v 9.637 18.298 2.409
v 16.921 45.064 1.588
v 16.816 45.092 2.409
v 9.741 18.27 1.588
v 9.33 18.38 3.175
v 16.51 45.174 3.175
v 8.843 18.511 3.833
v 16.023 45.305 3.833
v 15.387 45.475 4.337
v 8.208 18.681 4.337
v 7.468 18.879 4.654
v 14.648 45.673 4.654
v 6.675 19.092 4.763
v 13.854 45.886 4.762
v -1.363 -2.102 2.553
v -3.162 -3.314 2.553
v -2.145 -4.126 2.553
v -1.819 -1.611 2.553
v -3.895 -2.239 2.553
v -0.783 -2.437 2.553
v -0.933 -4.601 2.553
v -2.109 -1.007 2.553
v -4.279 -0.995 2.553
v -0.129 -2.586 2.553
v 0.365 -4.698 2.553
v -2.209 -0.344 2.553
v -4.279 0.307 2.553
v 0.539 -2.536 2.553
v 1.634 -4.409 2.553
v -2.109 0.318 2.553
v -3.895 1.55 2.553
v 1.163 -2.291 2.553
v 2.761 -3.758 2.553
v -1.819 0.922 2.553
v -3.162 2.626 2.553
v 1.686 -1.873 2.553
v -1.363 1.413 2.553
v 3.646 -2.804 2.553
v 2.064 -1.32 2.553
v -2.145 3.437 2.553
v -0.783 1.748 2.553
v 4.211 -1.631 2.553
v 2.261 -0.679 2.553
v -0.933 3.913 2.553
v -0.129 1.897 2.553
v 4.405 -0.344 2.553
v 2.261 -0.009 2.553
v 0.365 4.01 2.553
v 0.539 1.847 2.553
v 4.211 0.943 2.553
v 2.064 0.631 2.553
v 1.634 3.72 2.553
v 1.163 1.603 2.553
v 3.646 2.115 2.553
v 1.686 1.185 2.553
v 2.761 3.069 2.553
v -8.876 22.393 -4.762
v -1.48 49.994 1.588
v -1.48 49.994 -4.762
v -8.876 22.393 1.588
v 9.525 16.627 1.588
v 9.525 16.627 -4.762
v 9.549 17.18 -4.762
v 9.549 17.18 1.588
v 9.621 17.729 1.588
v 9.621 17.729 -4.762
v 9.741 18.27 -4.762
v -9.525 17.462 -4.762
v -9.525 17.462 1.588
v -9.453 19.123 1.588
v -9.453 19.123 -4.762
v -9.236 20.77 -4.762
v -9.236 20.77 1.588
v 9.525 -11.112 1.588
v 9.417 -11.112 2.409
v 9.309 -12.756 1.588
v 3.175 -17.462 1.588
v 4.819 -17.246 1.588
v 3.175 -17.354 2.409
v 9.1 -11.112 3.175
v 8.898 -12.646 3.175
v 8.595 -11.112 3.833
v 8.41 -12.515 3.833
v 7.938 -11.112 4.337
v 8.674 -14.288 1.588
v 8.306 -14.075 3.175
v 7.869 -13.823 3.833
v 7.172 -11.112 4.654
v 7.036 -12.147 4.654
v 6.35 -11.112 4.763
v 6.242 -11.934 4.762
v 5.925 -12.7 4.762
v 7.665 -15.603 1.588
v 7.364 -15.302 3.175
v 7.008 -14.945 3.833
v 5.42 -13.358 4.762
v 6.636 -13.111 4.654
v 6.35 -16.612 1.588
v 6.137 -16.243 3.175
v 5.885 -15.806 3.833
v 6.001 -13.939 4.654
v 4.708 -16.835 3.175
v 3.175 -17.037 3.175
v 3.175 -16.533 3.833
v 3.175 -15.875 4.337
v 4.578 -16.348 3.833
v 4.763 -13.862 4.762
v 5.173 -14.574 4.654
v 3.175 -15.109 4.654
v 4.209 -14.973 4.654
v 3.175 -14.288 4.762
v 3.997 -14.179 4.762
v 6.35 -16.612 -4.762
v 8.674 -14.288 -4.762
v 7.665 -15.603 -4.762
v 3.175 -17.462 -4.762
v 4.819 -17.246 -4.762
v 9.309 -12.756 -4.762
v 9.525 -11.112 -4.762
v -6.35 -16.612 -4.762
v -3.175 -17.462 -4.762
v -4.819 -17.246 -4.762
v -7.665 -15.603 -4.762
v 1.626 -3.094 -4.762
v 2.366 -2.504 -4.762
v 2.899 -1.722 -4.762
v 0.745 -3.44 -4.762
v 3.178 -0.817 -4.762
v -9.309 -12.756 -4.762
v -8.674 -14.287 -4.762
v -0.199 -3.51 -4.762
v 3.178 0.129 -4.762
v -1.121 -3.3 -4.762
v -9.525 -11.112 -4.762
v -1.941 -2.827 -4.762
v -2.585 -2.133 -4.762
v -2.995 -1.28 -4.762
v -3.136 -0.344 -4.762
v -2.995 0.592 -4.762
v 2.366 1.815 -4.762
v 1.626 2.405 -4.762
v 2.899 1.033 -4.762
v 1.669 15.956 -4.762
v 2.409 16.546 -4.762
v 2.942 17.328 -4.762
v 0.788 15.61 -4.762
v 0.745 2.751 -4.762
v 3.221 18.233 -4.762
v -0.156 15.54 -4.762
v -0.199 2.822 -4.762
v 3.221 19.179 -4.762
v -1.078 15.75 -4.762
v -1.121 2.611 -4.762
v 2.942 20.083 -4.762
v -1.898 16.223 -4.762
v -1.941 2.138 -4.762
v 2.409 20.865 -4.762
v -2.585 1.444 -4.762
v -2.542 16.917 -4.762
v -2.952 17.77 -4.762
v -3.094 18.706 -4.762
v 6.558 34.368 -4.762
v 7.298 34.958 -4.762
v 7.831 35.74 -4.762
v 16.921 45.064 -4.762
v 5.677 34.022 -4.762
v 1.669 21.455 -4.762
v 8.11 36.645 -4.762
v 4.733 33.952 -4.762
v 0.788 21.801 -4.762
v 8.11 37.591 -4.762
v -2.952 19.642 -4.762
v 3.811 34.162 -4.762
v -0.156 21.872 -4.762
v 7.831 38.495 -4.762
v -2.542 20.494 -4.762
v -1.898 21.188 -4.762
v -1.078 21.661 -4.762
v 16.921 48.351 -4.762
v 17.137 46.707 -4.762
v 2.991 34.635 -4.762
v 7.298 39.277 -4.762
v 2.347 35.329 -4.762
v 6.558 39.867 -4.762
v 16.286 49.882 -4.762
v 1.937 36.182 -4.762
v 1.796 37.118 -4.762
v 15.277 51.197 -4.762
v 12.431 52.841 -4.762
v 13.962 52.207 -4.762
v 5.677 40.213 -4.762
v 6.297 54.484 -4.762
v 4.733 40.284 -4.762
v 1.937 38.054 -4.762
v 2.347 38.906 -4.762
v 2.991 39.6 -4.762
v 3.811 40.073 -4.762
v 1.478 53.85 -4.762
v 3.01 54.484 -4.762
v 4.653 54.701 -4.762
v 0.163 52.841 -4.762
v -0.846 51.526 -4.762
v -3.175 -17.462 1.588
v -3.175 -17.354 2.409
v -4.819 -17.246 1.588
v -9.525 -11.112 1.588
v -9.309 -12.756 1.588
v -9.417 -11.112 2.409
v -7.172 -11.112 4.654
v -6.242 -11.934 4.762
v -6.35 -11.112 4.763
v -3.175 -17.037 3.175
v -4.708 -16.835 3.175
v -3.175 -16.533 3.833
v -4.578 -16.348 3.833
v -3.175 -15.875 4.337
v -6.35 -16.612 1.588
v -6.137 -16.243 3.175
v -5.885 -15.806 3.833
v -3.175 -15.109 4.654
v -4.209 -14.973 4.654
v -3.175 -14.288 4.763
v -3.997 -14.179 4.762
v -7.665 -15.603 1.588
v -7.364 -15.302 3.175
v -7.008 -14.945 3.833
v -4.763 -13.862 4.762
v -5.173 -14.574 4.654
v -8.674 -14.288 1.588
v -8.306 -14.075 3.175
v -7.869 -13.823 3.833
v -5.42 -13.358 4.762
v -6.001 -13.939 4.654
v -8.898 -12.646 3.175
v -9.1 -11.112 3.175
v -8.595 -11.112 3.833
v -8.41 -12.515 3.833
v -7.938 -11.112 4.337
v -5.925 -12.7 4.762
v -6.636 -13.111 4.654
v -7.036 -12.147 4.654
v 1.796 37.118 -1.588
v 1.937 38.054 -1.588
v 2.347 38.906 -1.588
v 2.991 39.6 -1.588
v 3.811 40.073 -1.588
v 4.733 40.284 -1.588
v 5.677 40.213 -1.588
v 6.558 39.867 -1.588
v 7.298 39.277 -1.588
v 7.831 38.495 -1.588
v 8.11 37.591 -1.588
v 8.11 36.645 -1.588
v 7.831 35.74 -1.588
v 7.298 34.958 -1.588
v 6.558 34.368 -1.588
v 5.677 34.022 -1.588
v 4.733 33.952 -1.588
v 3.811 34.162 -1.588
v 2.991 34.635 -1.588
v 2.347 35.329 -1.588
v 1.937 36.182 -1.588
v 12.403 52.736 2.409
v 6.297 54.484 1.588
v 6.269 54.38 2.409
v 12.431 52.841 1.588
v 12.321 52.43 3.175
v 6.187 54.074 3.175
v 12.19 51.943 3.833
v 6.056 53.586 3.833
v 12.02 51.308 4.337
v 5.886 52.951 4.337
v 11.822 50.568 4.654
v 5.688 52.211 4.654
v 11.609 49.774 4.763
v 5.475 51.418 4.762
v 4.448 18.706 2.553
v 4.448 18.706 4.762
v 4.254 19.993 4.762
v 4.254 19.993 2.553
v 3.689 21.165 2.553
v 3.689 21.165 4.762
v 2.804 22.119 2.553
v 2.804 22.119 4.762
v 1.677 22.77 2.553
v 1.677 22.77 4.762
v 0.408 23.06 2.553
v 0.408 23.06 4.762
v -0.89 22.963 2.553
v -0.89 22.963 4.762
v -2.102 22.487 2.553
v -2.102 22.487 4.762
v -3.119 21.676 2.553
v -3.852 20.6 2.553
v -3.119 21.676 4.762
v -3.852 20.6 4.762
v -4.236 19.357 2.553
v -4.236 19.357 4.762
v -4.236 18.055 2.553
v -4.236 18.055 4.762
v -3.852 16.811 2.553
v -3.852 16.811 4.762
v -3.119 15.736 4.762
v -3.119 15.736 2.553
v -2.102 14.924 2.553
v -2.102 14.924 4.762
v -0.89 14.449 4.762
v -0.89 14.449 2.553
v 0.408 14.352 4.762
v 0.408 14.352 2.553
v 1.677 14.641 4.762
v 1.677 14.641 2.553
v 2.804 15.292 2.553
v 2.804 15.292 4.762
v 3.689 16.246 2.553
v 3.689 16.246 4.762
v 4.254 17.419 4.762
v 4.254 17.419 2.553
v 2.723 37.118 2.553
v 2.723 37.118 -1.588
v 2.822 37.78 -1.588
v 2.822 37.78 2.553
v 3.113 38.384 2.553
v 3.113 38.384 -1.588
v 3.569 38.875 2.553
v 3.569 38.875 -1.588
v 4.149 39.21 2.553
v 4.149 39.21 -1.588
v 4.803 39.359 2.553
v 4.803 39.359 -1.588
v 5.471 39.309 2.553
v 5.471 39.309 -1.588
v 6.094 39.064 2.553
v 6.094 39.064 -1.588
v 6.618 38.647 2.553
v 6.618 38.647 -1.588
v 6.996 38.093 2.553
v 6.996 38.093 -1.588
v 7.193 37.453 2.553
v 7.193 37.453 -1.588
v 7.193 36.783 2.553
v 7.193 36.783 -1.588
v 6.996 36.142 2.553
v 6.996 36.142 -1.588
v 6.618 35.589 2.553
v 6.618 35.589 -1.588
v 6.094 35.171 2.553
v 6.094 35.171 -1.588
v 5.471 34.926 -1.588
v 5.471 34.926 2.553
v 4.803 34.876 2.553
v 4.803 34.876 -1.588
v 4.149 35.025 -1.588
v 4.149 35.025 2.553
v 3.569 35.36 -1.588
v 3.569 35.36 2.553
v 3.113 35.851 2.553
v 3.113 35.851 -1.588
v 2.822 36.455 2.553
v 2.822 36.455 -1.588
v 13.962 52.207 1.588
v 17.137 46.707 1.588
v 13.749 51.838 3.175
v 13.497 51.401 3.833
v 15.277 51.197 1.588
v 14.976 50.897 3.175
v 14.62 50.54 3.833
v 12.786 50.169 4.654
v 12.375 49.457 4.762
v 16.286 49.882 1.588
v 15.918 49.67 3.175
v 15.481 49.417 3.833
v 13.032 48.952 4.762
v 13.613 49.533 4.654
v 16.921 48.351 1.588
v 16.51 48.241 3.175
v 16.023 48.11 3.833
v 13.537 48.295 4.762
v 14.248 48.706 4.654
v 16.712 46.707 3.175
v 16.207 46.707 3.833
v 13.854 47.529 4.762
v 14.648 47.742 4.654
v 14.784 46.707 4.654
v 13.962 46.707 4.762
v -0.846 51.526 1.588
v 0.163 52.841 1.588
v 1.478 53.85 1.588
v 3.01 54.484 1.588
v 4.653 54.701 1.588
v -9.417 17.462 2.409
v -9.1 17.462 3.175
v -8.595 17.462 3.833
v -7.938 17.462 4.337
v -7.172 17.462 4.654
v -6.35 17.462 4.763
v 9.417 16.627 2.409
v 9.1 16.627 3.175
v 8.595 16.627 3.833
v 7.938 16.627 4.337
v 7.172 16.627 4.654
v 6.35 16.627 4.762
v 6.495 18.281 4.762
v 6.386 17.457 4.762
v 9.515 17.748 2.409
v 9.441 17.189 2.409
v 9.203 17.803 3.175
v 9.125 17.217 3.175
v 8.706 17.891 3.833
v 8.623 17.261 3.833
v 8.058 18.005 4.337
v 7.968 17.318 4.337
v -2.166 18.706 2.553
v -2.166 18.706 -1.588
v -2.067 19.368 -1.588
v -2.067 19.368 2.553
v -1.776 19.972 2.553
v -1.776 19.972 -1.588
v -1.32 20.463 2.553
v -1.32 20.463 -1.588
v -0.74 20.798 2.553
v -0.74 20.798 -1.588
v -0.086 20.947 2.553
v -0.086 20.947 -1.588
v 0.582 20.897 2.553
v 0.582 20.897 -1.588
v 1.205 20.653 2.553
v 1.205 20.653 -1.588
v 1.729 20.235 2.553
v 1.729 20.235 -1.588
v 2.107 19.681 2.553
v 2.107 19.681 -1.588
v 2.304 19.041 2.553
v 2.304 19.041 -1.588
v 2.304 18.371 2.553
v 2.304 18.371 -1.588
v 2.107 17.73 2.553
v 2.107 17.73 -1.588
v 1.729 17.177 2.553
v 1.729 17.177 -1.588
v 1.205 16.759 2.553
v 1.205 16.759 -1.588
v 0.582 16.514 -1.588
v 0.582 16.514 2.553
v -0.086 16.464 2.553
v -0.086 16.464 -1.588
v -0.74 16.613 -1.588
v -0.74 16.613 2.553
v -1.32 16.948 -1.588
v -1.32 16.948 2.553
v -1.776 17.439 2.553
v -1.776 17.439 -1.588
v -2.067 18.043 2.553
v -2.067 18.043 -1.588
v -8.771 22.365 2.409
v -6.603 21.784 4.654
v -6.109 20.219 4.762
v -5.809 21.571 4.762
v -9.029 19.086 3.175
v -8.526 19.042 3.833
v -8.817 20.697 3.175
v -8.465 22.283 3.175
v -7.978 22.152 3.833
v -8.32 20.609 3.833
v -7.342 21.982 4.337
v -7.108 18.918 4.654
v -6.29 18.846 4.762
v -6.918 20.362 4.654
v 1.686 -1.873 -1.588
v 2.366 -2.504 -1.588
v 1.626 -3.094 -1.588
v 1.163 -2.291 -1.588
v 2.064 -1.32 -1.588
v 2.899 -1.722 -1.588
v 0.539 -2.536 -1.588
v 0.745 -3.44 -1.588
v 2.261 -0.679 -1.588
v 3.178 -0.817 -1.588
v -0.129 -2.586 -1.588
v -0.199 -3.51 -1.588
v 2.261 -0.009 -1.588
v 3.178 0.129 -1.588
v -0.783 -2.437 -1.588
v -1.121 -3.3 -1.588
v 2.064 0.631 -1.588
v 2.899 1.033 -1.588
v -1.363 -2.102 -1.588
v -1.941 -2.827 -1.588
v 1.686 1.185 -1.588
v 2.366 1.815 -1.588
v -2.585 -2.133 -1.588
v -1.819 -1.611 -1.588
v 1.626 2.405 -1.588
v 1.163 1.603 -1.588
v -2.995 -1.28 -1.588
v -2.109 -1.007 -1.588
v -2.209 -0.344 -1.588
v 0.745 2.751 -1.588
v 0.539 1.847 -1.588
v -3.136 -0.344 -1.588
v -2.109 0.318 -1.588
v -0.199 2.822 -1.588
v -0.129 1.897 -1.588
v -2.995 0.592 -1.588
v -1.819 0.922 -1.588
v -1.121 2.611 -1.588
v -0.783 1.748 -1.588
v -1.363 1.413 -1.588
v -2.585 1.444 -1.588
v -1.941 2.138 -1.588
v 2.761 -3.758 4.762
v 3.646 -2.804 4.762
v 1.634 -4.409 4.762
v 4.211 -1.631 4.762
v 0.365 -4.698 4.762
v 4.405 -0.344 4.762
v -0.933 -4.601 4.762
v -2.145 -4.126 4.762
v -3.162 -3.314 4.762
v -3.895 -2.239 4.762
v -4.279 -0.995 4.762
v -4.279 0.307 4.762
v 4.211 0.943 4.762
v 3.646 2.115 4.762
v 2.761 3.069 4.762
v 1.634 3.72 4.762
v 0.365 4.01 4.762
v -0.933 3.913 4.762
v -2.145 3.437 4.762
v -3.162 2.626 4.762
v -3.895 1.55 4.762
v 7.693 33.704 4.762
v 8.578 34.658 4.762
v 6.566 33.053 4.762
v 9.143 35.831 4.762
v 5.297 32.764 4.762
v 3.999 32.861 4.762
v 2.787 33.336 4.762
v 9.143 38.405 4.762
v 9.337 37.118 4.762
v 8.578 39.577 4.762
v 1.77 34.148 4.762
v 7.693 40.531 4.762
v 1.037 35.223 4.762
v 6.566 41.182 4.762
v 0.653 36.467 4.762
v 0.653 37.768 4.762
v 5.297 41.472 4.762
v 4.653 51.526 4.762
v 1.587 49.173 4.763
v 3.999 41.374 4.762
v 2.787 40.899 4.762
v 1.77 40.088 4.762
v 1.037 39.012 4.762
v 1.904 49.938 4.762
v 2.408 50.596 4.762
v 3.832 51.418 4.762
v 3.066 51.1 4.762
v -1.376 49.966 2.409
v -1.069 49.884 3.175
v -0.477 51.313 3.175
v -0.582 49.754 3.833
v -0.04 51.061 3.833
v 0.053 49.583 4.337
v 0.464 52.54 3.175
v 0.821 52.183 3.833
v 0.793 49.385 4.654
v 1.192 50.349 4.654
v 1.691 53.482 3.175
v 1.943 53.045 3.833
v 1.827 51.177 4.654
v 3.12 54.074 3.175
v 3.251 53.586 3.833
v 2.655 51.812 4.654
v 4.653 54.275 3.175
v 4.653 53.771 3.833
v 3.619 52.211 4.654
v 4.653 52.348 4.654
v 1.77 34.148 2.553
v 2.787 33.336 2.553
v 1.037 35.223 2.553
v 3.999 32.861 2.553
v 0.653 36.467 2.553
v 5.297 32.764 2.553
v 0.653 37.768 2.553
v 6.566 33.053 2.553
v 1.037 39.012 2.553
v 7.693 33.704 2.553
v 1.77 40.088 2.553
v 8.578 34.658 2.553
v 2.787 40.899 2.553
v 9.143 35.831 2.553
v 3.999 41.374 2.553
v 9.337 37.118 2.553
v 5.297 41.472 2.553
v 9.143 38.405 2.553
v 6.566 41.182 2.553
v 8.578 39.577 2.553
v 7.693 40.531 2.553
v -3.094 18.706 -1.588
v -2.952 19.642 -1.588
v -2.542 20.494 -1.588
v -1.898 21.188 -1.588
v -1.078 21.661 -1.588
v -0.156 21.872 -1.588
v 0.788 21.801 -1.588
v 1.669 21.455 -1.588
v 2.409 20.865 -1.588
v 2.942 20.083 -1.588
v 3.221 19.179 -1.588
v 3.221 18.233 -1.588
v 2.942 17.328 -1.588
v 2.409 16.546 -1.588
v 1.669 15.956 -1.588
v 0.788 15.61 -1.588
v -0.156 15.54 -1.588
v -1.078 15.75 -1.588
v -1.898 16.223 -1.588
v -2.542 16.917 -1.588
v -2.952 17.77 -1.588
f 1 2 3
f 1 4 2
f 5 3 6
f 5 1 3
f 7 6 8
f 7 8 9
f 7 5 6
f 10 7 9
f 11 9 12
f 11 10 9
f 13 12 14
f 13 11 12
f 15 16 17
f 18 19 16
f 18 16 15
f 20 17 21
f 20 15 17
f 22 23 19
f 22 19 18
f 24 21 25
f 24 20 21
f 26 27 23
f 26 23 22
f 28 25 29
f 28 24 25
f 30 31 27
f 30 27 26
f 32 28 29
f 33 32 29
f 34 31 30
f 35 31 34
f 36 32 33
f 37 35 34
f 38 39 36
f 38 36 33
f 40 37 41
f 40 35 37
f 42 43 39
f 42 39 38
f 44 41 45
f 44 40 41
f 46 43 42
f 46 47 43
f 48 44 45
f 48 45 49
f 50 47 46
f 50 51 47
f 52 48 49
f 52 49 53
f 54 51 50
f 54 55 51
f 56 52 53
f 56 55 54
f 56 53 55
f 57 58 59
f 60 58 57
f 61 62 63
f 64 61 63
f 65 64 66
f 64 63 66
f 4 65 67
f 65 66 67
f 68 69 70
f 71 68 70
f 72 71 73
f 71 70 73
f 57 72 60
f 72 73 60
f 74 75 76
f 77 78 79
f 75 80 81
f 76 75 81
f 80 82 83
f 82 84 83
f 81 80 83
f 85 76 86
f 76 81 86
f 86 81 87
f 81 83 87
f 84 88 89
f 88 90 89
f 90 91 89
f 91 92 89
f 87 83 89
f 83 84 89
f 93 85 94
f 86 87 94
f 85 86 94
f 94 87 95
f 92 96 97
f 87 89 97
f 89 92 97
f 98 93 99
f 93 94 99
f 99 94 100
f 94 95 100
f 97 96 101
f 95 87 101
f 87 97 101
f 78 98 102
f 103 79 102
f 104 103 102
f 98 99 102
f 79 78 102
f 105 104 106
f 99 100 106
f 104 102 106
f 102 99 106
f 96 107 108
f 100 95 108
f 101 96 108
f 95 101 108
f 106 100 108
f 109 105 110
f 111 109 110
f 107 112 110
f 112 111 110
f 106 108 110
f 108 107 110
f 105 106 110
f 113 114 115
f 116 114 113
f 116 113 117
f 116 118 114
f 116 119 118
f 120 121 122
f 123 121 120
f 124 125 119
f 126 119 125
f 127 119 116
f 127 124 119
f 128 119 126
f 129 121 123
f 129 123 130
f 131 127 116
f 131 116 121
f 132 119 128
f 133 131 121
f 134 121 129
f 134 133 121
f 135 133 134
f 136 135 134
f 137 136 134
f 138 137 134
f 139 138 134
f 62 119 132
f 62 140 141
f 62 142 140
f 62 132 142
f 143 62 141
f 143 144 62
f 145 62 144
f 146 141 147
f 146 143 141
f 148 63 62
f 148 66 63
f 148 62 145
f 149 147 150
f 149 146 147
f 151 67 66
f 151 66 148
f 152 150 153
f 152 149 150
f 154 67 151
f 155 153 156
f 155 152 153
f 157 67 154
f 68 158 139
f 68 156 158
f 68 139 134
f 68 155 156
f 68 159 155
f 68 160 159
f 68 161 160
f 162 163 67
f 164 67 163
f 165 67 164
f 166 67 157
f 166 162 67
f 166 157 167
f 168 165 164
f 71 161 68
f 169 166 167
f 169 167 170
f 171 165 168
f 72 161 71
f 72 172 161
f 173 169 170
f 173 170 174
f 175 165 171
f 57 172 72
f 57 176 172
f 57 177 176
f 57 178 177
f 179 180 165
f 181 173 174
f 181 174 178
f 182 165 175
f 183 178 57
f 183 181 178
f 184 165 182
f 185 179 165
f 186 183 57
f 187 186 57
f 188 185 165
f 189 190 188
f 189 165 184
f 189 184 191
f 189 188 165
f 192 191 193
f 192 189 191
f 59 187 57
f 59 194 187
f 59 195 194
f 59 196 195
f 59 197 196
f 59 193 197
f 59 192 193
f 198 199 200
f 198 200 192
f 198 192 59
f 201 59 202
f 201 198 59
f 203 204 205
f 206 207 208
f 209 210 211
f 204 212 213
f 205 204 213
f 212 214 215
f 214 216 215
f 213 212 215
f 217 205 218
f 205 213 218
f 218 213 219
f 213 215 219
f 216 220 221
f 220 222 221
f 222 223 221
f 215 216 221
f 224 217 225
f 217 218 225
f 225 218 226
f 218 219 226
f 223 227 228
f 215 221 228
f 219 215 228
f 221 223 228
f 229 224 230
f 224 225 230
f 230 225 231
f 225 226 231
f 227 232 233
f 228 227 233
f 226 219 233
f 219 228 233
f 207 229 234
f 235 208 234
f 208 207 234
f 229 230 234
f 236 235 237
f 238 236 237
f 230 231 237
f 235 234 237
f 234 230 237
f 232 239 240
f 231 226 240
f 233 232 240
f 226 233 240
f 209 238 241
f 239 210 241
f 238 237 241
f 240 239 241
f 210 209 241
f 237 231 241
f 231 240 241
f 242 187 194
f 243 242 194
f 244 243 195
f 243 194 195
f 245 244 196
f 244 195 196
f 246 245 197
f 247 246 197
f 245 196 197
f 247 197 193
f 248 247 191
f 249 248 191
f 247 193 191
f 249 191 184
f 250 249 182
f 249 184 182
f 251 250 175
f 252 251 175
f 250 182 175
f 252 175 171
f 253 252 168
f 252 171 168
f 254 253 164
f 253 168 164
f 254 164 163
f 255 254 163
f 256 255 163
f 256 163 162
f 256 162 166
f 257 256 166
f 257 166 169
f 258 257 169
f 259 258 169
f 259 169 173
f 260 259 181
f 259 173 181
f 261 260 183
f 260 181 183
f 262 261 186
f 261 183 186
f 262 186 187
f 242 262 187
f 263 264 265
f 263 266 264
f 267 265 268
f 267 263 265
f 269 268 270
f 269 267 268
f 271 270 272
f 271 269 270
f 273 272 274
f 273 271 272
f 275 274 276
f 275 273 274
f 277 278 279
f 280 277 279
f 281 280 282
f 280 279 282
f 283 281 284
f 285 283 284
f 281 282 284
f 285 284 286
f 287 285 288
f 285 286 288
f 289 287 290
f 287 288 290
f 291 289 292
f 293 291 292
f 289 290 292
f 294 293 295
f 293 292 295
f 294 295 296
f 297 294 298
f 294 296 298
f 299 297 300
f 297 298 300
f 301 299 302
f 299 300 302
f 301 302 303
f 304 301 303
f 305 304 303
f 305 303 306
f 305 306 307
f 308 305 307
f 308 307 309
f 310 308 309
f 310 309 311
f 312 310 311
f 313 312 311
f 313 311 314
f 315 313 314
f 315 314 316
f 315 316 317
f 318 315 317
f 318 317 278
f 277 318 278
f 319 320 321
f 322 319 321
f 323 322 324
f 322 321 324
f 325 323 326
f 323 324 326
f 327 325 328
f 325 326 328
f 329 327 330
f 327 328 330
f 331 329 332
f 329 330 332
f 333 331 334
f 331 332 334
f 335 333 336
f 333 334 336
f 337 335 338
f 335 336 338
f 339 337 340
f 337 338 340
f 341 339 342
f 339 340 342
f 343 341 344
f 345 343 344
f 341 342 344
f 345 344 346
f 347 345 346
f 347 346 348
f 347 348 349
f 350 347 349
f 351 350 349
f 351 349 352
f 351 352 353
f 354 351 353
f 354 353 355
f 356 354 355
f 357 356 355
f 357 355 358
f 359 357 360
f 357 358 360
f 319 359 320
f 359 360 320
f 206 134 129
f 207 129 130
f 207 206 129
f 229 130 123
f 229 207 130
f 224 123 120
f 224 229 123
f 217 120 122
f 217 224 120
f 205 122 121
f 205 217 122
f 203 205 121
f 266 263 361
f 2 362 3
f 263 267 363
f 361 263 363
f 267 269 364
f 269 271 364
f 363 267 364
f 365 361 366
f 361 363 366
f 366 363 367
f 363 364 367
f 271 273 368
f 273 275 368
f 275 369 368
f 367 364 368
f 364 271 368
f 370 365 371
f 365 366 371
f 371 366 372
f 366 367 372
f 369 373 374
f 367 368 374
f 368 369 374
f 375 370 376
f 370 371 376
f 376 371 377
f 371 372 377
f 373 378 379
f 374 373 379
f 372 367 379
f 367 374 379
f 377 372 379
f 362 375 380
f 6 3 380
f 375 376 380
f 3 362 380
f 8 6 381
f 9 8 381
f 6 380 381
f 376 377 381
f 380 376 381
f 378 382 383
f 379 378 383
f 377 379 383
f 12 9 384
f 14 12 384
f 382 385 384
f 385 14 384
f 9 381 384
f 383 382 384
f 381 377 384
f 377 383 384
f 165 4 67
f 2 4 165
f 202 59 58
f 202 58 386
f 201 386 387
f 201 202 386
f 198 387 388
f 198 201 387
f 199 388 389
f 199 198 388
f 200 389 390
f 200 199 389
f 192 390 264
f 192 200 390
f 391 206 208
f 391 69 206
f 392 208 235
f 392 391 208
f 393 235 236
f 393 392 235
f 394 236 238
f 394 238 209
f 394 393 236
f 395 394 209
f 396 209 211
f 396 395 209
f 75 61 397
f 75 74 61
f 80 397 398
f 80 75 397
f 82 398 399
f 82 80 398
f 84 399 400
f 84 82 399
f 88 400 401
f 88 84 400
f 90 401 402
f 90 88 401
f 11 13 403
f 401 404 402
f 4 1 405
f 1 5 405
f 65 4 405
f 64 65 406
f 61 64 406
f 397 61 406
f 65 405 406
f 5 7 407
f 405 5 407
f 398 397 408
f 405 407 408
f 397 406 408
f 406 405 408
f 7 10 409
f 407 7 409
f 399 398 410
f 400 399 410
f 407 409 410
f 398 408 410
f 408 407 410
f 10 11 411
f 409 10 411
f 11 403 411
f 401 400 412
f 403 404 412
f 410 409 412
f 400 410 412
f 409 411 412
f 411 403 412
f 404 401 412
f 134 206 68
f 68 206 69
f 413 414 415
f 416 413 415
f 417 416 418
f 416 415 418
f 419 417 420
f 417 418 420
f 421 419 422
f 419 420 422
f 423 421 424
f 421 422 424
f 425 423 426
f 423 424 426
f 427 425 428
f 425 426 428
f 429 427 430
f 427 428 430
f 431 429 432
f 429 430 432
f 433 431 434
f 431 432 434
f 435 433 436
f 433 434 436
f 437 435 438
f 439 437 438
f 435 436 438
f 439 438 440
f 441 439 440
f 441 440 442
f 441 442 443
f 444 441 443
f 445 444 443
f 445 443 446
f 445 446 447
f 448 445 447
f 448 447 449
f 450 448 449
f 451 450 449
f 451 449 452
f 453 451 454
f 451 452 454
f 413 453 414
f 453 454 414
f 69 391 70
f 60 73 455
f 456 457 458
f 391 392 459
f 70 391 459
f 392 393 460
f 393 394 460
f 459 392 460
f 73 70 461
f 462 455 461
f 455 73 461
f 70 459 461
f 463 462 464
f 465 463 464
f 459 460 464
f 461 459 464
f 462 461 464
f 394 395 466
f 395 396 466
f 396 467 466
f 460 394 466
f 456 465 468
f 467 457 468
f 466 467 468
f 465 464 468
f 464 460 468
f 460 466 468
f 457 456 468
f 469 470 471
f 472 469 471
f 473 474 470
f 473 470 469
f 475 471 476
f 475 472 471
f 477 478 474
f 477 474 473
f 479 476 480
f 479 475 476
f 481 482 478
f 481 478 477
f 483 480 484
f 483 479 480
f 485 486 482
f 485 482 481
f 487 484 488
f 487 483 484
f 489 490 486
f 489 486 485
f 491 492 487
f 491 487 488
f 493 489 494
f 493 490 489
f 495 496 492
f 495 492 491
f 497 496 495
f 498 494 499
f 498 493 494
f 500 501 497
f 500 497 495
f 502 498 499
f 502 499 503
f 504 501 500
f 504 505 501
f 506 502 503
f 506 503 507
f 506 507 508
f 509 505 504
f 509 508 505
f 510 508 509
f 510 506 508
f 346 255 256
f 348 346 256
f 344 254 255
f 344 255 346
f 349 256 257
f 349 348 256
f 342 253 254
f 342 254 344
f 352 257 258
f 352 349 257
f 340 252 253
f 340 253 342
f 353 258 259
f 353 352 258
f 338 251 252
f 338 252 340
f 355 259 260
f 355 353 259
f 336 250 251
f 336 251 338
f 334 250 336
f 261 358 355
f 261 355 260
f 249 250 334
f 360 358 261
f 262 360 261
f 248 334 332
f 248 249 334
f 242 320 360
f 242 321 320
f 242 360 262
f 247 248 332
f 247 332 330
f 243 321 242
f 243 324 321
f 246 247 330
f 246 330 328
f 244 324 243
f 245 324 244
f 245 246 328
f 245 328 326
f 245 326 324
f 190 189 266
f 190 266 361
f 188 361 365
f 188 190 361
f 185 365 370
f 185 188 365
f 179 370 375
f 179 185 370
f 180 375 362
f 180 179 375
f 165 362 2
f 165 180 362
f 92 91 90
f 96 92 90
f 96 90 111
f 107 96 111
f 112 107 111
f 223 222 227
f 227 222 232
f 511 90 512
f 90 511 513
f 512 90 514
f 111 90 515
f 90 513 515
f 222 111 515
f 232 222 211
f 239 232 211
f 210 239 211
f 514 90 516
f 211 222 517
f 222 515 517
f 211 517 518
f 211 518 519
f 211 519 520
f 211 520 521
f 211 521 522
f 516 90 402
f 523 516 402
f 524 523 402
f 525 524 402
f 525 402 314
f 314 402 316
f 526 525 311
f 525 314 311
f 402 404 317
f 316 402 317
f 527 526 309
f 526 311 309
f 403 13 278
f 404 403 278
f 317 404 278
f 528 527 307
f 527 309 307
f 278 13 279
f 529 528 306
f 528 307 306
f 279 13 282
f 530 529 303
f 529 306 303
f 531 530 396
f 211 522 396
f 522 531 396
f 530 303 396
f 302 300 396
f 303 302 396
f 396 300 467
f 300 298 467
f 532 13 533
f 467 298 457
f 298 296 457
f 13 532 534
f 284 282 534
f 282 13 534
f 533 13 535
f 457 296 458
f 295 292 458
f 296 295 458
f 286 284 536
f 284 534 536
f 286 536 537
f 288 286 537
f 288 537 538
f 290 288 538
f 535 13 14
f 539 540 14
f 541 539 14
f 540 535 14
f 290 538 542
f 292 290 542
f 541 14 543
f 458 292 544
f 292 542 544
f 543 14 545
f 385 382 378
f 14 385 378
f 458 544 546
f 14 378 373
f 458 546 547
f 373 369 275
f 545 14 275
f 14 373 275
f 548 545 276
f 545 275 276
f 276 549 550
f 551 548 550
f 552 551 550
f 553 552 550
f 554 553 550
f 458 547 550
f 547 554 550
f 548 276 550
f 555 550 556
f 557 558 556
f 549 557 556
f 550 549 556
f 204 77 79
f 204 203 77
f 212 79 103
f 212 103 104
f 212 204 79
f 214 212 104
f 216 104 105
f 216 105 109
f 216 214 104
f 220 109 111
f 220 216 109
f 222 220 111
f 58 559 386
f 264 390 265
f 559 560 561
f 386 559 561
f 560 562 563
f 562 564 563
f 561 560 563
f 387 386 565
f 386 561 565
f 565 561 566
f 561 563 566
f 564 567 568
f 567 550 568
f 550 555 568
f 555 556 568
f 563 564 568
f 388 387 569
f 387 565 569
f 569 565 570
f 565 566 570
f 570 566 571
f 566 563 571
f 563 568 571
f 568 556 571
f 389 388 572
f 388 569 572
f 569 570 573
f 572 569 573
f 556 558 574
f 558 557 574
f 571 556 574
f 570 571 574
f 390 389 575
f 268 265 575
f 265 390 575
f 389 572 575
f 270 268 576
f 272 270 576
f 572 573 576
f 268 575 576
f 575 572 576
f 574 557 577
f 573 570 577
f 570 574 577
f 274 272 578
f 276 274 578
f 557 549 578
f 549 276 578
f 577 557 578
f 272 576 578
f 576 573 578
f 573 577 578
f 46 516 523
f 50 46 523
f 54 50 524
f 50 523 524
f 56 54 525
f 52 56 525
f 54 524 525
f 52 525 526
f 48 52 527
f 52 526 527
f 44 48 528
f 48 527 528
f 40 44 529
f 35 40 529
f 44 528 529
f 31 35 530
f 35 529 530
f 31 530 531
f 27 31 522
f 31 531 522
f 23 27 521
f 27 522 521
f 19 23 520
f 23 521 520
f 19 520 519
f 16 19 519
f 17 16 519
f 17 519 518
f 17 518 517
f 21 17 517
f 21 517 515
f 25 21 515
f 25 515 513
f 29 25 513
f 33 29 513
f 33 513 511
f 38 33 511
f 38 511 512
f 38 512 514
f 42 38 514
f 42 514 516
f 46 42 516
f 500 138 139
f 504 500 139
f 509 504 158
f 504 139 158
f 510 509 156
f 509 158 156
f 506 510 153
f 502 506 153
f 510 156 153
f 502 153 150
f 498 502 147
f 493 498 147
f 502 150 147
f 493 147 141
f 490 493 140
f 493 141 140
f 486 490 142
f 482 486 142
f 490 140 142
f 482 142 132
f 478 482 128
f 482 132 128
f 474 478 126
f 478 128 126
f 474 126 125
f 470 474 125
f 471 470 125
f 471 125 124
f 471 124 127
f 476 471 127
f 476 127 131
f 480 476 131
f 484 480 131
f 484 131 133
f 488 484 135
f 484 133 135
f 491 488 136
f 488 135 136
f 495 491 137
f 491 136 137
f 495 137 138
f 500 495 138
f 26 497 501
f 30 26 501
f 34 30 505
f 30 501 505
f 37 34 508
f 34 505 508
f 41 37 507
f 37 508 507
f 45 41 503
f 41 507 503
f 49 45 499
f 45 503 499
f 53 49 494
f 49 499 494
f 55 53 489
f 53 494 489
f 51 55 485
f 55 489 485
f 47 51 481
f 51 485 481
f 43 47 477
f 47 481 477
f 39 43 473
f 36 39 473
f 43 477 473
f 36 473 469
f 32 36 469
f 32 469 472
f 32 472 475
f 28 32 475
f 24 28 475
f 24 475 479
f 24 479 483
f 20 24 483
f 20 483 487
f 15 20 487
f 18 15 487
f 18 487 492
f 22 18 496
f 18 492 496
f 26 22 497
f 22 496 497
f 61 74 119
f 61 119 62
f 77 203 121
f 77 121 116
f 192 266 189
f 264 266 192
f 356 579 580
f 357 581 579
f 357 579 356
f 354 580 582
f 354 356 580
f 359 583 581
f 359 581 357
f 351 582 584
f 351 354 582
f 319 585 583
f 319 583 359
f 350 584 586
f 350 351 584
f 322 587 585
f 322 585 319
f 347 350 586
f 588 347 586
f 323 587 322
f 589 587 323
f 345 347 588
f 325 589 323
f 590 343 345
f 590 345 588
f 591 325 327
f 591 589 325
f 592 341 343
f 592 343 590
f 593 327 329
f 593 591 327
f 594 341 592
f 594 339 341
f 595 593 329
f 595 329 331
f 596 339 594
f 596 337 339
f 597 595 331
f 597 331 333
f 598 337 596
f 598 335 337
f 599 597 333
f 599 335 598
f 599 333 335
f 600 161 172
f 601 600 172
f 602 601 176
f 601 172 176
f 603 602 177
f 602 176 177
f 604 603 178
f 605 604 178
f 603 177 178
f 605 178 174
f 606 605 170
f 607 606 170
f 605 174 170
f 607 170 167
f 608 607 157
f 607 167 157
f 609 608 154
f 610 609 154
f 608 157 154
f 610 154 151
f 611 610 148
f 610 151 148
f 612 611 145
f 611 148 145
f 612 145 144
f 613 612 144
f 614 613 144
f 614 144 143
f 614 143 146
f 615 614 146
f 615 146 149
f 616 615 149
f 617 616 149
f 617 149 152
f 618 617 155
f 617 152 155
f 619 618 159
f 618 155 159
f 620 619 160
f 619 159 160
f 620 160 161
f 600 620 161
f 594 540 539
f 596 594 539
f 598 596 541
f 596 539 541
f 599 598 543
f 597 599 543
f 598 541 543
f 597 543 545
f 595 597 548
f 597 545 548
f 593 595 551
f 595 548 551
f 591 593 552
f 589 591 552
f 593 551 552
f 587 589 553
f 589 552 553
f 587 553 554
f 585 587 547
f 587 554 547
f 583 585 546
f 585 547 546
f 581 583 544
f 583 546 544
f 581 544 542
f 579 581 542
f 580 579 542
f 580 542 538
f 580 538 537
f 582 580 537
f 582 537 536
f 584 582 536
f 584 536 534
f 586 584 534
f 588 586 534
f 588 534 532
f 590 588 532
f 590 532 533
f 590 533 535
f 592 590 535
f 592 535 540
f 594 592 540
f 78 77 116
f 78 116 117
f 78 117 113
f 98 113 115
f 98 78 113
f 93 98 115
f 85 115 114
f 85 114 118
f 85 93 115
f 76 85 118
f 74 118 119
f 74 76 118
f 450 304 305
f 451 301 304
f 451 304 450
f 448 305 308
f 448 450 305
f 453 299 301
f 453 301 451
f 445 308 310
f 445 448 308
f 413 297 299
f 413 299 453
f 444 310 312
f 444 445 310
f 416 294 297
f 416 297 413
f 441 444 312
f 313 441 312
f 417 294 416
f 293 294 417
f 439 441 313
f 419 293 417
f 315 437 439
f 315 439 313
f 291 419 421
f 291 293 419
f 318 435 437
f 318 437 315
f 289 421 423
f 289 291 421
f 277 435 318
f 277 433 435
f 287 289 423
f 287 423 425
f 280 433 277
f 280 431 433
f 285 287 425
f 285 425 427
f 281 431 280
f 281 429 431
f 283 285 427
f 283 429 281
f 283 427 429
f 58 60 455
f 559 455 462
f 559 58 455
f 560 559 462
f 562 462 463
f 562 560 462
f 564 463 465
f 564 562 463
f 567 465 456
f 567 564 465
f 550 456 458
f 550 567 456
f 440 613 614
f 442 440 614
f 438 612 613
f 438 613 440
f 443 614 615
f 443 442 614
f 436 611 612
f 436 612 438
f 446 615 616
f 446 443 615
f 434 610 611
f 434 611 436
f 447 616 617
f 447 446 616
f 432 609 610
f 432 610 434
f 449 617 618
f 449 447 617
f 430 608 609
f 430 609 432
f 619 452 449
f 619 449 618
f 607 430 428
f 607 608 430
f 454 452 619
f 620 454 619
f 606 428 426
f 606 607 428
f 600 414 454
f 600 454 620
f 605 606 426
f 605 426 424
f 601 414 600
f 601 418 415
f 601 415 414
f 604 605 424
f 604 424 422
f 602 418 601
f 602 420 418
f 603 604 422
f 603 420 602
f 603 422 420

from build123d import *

# Parameters (mm, degrees)
SKETCH1_W                                      = 19.05
SKETCH1_H                                      = 34.925
BOSS_EXTRUDE1_DEPTH                            = 4.7625
BOSS_EXTRUDE2_DEPTH                            = 9.525
BOSS_EXTRUDE3_DEPTH                            = 9.525
CBORE_FOR_8_BUTTON_HEAD_CAP_SCREW1_D           = 4.4958
CBORE_FOR_8_BUTTON_HEAD_CAP_SCREW1_CBORE_D     = 8.73252
CBORE_FOR_8_BUTTON_HEAD_CAP_SCREW1_CBORE_DEPTH = 2.2098
FILLET1_R                                      = 6.35
SKETCH6_R                                      = 3.175
SKETCH6_R_2                                    = 2.2479
CUT_EXTRUDE1_DEPTH                             = 3.175
FILLET2_R                                      = 3.175


with BuildPart() as part:
    # Sketch1 → Boss-Extrude1 (new, symmetric)
    with BuildSketch(Plane.XY):
        Rectangle(SKETCH1_W, SKETCH1_H)
    extrude(amount=BOSS_EXTRUDE1_DEPTH, both=True)



with BuildPart() as body_2:
    # Sketch2 → Boss-Extrude2 (new body)
    with BuildSketch(Plane.XY.offset(4.7625)):
        Polygon((9.525, 17.4625), (18.56425515, 51.197459483), (0.163368159, 56.127962292), (-8.875886991, 22.393002809), align=None)
    extrude(amount=-BOSS_EXTRUDE2_DEPTH)


with BuildPart() as part_1:
    add(part.part)

    add(body_2.part)  # Boss-Extrude3 merges body 2
    # Sketch3 → Boss-Extrude3 (add)
    with BuildSketch(Plane.XY.offset(4.7625)):
        with BuildLine():
            Line((-8.875886991, 22.393002809), (9.525, 17.4625))
            Line((9.525, 17.4625), (-9.525, 17.4625))
            ThreePointArc((-9.525, 17.4625), (-9.362024609, 19.949023962), (-8.875886991, 22.393002809))
        make_face()
    extrude(amount=-BOSS_EXTRUDE3_DEPTH)

    # CBORE for #8 Button Head Cap Screw1 (through all)
    with Locations(Plane.XY.offset(4.7625)):
        with Locations((0.038567729, -0.344238019), (0.081487695, 18.705761981), (4.970520592, 37.117710746)):
            CounterBoreHole(CBORE_FOR_8_BUTTON_HEAD_CAP_SCREW1_D / 2, CBORE_FOR_8_BUTTON_HEAD_CAP_SCREW1_CBORE_D / 2, CBORE_FOR_8_BUTTON_HEAD_CAP_SCREW1_CBORE_DEPTH)

    # Fillet1
    fillet1_edges = [part_1.edges().sort_by_distance(p)[0] for p in [
        (18.56425515, 51.197459483, 0),
        (0.163368159, 56.127962292, 0),
        (9.525, -17.4625, 0),
        (-9.525, -17.4625, 0),
        (9.525, 17.4625, 0),
    ]]
    fillet(fillet1_edges, radius=FILLET1_R)

    # Sketch6 → Cut-Extrude1 (cut)
    # profile 1 of 3: a face of its own
    with BuildSketch(Plane(origin=(0, 0, -4.7625), x_dir=(-1, 0, 0), z_dir=(0, 0, -1))):
        with Locations((-4.970520592, 37.117710746)):
            Circle(SKETCH6_R)
        with Locations(Location((-4.970520592, 37.117710746, 0), (0, 0, 180))):
            Circle(SKETCH6_R_2, mode=Mode.SUBTRACT)
    # profile 2 of 3: a face of its own
    with BuildSketch(Plane(origin=(0, 0, -4.7625), x_dir=(-1, 0, 0), z_dir=(0, 0, -1))):
        with Locations((-0.081487695, 18.705761981)):
            Circle(SKETCH6_R)
        with Locations(Location((-0.081487695, 18.705761981, 0), (0, 0, 180))):
            Circle(SKETCH6_R_2, mode=Mode.SUBTRACT)
    # profile 3 of 3: a face of its own
    with BuildSketch(Plane(origin=(0, 0, -4.7625), x_dir=(-1, 0, 0), z_dir=(0, 0, -1))):
        with Locations((-0.038567729, -0.344238019)):
            Circle(SKETCH6_R)
        with Locations(Location((-0.038567729, -0.344238019, 0), (0, 0, 180))):
            Circle(SKETCH6_R_2, mode=Mode.SUBTRACT)
    extrude(amount=-CUT_EXTRUDE1_DEPTH, mode=Mode.SUBTRACT)

    # Fillet2
    fillet2_edges = [part_1.edges().sort_by_distance(p)[0] for p in [
        (-9.525, 3.175, 4.7625),
        (-9.362024609, 19.949023962, 4.7625),
        (13.331062608, 31.666919031, 4.7625),
        (9.525, 2.75700332, 4.7625),
        (9.363811655, 53.662710888, 4.7625),
        (-5.178009884, 36.193668052, 4.7625),
        (0, -17.4625, 4.7625),
        (16.286386531, 49.882331423, 4.7625),
        (7.665128061, -15.602628061, 4.7625),
        (-7.665128061, -15.602628061, 4.7625),
        (1.47849622, 53.850093673, 4.7625),
        (9.57932513, 17.455347961, 4.7625),
    ]]
    fillet(fillet2_edges, radius=FILLET2_R)


solid = part_1.part
